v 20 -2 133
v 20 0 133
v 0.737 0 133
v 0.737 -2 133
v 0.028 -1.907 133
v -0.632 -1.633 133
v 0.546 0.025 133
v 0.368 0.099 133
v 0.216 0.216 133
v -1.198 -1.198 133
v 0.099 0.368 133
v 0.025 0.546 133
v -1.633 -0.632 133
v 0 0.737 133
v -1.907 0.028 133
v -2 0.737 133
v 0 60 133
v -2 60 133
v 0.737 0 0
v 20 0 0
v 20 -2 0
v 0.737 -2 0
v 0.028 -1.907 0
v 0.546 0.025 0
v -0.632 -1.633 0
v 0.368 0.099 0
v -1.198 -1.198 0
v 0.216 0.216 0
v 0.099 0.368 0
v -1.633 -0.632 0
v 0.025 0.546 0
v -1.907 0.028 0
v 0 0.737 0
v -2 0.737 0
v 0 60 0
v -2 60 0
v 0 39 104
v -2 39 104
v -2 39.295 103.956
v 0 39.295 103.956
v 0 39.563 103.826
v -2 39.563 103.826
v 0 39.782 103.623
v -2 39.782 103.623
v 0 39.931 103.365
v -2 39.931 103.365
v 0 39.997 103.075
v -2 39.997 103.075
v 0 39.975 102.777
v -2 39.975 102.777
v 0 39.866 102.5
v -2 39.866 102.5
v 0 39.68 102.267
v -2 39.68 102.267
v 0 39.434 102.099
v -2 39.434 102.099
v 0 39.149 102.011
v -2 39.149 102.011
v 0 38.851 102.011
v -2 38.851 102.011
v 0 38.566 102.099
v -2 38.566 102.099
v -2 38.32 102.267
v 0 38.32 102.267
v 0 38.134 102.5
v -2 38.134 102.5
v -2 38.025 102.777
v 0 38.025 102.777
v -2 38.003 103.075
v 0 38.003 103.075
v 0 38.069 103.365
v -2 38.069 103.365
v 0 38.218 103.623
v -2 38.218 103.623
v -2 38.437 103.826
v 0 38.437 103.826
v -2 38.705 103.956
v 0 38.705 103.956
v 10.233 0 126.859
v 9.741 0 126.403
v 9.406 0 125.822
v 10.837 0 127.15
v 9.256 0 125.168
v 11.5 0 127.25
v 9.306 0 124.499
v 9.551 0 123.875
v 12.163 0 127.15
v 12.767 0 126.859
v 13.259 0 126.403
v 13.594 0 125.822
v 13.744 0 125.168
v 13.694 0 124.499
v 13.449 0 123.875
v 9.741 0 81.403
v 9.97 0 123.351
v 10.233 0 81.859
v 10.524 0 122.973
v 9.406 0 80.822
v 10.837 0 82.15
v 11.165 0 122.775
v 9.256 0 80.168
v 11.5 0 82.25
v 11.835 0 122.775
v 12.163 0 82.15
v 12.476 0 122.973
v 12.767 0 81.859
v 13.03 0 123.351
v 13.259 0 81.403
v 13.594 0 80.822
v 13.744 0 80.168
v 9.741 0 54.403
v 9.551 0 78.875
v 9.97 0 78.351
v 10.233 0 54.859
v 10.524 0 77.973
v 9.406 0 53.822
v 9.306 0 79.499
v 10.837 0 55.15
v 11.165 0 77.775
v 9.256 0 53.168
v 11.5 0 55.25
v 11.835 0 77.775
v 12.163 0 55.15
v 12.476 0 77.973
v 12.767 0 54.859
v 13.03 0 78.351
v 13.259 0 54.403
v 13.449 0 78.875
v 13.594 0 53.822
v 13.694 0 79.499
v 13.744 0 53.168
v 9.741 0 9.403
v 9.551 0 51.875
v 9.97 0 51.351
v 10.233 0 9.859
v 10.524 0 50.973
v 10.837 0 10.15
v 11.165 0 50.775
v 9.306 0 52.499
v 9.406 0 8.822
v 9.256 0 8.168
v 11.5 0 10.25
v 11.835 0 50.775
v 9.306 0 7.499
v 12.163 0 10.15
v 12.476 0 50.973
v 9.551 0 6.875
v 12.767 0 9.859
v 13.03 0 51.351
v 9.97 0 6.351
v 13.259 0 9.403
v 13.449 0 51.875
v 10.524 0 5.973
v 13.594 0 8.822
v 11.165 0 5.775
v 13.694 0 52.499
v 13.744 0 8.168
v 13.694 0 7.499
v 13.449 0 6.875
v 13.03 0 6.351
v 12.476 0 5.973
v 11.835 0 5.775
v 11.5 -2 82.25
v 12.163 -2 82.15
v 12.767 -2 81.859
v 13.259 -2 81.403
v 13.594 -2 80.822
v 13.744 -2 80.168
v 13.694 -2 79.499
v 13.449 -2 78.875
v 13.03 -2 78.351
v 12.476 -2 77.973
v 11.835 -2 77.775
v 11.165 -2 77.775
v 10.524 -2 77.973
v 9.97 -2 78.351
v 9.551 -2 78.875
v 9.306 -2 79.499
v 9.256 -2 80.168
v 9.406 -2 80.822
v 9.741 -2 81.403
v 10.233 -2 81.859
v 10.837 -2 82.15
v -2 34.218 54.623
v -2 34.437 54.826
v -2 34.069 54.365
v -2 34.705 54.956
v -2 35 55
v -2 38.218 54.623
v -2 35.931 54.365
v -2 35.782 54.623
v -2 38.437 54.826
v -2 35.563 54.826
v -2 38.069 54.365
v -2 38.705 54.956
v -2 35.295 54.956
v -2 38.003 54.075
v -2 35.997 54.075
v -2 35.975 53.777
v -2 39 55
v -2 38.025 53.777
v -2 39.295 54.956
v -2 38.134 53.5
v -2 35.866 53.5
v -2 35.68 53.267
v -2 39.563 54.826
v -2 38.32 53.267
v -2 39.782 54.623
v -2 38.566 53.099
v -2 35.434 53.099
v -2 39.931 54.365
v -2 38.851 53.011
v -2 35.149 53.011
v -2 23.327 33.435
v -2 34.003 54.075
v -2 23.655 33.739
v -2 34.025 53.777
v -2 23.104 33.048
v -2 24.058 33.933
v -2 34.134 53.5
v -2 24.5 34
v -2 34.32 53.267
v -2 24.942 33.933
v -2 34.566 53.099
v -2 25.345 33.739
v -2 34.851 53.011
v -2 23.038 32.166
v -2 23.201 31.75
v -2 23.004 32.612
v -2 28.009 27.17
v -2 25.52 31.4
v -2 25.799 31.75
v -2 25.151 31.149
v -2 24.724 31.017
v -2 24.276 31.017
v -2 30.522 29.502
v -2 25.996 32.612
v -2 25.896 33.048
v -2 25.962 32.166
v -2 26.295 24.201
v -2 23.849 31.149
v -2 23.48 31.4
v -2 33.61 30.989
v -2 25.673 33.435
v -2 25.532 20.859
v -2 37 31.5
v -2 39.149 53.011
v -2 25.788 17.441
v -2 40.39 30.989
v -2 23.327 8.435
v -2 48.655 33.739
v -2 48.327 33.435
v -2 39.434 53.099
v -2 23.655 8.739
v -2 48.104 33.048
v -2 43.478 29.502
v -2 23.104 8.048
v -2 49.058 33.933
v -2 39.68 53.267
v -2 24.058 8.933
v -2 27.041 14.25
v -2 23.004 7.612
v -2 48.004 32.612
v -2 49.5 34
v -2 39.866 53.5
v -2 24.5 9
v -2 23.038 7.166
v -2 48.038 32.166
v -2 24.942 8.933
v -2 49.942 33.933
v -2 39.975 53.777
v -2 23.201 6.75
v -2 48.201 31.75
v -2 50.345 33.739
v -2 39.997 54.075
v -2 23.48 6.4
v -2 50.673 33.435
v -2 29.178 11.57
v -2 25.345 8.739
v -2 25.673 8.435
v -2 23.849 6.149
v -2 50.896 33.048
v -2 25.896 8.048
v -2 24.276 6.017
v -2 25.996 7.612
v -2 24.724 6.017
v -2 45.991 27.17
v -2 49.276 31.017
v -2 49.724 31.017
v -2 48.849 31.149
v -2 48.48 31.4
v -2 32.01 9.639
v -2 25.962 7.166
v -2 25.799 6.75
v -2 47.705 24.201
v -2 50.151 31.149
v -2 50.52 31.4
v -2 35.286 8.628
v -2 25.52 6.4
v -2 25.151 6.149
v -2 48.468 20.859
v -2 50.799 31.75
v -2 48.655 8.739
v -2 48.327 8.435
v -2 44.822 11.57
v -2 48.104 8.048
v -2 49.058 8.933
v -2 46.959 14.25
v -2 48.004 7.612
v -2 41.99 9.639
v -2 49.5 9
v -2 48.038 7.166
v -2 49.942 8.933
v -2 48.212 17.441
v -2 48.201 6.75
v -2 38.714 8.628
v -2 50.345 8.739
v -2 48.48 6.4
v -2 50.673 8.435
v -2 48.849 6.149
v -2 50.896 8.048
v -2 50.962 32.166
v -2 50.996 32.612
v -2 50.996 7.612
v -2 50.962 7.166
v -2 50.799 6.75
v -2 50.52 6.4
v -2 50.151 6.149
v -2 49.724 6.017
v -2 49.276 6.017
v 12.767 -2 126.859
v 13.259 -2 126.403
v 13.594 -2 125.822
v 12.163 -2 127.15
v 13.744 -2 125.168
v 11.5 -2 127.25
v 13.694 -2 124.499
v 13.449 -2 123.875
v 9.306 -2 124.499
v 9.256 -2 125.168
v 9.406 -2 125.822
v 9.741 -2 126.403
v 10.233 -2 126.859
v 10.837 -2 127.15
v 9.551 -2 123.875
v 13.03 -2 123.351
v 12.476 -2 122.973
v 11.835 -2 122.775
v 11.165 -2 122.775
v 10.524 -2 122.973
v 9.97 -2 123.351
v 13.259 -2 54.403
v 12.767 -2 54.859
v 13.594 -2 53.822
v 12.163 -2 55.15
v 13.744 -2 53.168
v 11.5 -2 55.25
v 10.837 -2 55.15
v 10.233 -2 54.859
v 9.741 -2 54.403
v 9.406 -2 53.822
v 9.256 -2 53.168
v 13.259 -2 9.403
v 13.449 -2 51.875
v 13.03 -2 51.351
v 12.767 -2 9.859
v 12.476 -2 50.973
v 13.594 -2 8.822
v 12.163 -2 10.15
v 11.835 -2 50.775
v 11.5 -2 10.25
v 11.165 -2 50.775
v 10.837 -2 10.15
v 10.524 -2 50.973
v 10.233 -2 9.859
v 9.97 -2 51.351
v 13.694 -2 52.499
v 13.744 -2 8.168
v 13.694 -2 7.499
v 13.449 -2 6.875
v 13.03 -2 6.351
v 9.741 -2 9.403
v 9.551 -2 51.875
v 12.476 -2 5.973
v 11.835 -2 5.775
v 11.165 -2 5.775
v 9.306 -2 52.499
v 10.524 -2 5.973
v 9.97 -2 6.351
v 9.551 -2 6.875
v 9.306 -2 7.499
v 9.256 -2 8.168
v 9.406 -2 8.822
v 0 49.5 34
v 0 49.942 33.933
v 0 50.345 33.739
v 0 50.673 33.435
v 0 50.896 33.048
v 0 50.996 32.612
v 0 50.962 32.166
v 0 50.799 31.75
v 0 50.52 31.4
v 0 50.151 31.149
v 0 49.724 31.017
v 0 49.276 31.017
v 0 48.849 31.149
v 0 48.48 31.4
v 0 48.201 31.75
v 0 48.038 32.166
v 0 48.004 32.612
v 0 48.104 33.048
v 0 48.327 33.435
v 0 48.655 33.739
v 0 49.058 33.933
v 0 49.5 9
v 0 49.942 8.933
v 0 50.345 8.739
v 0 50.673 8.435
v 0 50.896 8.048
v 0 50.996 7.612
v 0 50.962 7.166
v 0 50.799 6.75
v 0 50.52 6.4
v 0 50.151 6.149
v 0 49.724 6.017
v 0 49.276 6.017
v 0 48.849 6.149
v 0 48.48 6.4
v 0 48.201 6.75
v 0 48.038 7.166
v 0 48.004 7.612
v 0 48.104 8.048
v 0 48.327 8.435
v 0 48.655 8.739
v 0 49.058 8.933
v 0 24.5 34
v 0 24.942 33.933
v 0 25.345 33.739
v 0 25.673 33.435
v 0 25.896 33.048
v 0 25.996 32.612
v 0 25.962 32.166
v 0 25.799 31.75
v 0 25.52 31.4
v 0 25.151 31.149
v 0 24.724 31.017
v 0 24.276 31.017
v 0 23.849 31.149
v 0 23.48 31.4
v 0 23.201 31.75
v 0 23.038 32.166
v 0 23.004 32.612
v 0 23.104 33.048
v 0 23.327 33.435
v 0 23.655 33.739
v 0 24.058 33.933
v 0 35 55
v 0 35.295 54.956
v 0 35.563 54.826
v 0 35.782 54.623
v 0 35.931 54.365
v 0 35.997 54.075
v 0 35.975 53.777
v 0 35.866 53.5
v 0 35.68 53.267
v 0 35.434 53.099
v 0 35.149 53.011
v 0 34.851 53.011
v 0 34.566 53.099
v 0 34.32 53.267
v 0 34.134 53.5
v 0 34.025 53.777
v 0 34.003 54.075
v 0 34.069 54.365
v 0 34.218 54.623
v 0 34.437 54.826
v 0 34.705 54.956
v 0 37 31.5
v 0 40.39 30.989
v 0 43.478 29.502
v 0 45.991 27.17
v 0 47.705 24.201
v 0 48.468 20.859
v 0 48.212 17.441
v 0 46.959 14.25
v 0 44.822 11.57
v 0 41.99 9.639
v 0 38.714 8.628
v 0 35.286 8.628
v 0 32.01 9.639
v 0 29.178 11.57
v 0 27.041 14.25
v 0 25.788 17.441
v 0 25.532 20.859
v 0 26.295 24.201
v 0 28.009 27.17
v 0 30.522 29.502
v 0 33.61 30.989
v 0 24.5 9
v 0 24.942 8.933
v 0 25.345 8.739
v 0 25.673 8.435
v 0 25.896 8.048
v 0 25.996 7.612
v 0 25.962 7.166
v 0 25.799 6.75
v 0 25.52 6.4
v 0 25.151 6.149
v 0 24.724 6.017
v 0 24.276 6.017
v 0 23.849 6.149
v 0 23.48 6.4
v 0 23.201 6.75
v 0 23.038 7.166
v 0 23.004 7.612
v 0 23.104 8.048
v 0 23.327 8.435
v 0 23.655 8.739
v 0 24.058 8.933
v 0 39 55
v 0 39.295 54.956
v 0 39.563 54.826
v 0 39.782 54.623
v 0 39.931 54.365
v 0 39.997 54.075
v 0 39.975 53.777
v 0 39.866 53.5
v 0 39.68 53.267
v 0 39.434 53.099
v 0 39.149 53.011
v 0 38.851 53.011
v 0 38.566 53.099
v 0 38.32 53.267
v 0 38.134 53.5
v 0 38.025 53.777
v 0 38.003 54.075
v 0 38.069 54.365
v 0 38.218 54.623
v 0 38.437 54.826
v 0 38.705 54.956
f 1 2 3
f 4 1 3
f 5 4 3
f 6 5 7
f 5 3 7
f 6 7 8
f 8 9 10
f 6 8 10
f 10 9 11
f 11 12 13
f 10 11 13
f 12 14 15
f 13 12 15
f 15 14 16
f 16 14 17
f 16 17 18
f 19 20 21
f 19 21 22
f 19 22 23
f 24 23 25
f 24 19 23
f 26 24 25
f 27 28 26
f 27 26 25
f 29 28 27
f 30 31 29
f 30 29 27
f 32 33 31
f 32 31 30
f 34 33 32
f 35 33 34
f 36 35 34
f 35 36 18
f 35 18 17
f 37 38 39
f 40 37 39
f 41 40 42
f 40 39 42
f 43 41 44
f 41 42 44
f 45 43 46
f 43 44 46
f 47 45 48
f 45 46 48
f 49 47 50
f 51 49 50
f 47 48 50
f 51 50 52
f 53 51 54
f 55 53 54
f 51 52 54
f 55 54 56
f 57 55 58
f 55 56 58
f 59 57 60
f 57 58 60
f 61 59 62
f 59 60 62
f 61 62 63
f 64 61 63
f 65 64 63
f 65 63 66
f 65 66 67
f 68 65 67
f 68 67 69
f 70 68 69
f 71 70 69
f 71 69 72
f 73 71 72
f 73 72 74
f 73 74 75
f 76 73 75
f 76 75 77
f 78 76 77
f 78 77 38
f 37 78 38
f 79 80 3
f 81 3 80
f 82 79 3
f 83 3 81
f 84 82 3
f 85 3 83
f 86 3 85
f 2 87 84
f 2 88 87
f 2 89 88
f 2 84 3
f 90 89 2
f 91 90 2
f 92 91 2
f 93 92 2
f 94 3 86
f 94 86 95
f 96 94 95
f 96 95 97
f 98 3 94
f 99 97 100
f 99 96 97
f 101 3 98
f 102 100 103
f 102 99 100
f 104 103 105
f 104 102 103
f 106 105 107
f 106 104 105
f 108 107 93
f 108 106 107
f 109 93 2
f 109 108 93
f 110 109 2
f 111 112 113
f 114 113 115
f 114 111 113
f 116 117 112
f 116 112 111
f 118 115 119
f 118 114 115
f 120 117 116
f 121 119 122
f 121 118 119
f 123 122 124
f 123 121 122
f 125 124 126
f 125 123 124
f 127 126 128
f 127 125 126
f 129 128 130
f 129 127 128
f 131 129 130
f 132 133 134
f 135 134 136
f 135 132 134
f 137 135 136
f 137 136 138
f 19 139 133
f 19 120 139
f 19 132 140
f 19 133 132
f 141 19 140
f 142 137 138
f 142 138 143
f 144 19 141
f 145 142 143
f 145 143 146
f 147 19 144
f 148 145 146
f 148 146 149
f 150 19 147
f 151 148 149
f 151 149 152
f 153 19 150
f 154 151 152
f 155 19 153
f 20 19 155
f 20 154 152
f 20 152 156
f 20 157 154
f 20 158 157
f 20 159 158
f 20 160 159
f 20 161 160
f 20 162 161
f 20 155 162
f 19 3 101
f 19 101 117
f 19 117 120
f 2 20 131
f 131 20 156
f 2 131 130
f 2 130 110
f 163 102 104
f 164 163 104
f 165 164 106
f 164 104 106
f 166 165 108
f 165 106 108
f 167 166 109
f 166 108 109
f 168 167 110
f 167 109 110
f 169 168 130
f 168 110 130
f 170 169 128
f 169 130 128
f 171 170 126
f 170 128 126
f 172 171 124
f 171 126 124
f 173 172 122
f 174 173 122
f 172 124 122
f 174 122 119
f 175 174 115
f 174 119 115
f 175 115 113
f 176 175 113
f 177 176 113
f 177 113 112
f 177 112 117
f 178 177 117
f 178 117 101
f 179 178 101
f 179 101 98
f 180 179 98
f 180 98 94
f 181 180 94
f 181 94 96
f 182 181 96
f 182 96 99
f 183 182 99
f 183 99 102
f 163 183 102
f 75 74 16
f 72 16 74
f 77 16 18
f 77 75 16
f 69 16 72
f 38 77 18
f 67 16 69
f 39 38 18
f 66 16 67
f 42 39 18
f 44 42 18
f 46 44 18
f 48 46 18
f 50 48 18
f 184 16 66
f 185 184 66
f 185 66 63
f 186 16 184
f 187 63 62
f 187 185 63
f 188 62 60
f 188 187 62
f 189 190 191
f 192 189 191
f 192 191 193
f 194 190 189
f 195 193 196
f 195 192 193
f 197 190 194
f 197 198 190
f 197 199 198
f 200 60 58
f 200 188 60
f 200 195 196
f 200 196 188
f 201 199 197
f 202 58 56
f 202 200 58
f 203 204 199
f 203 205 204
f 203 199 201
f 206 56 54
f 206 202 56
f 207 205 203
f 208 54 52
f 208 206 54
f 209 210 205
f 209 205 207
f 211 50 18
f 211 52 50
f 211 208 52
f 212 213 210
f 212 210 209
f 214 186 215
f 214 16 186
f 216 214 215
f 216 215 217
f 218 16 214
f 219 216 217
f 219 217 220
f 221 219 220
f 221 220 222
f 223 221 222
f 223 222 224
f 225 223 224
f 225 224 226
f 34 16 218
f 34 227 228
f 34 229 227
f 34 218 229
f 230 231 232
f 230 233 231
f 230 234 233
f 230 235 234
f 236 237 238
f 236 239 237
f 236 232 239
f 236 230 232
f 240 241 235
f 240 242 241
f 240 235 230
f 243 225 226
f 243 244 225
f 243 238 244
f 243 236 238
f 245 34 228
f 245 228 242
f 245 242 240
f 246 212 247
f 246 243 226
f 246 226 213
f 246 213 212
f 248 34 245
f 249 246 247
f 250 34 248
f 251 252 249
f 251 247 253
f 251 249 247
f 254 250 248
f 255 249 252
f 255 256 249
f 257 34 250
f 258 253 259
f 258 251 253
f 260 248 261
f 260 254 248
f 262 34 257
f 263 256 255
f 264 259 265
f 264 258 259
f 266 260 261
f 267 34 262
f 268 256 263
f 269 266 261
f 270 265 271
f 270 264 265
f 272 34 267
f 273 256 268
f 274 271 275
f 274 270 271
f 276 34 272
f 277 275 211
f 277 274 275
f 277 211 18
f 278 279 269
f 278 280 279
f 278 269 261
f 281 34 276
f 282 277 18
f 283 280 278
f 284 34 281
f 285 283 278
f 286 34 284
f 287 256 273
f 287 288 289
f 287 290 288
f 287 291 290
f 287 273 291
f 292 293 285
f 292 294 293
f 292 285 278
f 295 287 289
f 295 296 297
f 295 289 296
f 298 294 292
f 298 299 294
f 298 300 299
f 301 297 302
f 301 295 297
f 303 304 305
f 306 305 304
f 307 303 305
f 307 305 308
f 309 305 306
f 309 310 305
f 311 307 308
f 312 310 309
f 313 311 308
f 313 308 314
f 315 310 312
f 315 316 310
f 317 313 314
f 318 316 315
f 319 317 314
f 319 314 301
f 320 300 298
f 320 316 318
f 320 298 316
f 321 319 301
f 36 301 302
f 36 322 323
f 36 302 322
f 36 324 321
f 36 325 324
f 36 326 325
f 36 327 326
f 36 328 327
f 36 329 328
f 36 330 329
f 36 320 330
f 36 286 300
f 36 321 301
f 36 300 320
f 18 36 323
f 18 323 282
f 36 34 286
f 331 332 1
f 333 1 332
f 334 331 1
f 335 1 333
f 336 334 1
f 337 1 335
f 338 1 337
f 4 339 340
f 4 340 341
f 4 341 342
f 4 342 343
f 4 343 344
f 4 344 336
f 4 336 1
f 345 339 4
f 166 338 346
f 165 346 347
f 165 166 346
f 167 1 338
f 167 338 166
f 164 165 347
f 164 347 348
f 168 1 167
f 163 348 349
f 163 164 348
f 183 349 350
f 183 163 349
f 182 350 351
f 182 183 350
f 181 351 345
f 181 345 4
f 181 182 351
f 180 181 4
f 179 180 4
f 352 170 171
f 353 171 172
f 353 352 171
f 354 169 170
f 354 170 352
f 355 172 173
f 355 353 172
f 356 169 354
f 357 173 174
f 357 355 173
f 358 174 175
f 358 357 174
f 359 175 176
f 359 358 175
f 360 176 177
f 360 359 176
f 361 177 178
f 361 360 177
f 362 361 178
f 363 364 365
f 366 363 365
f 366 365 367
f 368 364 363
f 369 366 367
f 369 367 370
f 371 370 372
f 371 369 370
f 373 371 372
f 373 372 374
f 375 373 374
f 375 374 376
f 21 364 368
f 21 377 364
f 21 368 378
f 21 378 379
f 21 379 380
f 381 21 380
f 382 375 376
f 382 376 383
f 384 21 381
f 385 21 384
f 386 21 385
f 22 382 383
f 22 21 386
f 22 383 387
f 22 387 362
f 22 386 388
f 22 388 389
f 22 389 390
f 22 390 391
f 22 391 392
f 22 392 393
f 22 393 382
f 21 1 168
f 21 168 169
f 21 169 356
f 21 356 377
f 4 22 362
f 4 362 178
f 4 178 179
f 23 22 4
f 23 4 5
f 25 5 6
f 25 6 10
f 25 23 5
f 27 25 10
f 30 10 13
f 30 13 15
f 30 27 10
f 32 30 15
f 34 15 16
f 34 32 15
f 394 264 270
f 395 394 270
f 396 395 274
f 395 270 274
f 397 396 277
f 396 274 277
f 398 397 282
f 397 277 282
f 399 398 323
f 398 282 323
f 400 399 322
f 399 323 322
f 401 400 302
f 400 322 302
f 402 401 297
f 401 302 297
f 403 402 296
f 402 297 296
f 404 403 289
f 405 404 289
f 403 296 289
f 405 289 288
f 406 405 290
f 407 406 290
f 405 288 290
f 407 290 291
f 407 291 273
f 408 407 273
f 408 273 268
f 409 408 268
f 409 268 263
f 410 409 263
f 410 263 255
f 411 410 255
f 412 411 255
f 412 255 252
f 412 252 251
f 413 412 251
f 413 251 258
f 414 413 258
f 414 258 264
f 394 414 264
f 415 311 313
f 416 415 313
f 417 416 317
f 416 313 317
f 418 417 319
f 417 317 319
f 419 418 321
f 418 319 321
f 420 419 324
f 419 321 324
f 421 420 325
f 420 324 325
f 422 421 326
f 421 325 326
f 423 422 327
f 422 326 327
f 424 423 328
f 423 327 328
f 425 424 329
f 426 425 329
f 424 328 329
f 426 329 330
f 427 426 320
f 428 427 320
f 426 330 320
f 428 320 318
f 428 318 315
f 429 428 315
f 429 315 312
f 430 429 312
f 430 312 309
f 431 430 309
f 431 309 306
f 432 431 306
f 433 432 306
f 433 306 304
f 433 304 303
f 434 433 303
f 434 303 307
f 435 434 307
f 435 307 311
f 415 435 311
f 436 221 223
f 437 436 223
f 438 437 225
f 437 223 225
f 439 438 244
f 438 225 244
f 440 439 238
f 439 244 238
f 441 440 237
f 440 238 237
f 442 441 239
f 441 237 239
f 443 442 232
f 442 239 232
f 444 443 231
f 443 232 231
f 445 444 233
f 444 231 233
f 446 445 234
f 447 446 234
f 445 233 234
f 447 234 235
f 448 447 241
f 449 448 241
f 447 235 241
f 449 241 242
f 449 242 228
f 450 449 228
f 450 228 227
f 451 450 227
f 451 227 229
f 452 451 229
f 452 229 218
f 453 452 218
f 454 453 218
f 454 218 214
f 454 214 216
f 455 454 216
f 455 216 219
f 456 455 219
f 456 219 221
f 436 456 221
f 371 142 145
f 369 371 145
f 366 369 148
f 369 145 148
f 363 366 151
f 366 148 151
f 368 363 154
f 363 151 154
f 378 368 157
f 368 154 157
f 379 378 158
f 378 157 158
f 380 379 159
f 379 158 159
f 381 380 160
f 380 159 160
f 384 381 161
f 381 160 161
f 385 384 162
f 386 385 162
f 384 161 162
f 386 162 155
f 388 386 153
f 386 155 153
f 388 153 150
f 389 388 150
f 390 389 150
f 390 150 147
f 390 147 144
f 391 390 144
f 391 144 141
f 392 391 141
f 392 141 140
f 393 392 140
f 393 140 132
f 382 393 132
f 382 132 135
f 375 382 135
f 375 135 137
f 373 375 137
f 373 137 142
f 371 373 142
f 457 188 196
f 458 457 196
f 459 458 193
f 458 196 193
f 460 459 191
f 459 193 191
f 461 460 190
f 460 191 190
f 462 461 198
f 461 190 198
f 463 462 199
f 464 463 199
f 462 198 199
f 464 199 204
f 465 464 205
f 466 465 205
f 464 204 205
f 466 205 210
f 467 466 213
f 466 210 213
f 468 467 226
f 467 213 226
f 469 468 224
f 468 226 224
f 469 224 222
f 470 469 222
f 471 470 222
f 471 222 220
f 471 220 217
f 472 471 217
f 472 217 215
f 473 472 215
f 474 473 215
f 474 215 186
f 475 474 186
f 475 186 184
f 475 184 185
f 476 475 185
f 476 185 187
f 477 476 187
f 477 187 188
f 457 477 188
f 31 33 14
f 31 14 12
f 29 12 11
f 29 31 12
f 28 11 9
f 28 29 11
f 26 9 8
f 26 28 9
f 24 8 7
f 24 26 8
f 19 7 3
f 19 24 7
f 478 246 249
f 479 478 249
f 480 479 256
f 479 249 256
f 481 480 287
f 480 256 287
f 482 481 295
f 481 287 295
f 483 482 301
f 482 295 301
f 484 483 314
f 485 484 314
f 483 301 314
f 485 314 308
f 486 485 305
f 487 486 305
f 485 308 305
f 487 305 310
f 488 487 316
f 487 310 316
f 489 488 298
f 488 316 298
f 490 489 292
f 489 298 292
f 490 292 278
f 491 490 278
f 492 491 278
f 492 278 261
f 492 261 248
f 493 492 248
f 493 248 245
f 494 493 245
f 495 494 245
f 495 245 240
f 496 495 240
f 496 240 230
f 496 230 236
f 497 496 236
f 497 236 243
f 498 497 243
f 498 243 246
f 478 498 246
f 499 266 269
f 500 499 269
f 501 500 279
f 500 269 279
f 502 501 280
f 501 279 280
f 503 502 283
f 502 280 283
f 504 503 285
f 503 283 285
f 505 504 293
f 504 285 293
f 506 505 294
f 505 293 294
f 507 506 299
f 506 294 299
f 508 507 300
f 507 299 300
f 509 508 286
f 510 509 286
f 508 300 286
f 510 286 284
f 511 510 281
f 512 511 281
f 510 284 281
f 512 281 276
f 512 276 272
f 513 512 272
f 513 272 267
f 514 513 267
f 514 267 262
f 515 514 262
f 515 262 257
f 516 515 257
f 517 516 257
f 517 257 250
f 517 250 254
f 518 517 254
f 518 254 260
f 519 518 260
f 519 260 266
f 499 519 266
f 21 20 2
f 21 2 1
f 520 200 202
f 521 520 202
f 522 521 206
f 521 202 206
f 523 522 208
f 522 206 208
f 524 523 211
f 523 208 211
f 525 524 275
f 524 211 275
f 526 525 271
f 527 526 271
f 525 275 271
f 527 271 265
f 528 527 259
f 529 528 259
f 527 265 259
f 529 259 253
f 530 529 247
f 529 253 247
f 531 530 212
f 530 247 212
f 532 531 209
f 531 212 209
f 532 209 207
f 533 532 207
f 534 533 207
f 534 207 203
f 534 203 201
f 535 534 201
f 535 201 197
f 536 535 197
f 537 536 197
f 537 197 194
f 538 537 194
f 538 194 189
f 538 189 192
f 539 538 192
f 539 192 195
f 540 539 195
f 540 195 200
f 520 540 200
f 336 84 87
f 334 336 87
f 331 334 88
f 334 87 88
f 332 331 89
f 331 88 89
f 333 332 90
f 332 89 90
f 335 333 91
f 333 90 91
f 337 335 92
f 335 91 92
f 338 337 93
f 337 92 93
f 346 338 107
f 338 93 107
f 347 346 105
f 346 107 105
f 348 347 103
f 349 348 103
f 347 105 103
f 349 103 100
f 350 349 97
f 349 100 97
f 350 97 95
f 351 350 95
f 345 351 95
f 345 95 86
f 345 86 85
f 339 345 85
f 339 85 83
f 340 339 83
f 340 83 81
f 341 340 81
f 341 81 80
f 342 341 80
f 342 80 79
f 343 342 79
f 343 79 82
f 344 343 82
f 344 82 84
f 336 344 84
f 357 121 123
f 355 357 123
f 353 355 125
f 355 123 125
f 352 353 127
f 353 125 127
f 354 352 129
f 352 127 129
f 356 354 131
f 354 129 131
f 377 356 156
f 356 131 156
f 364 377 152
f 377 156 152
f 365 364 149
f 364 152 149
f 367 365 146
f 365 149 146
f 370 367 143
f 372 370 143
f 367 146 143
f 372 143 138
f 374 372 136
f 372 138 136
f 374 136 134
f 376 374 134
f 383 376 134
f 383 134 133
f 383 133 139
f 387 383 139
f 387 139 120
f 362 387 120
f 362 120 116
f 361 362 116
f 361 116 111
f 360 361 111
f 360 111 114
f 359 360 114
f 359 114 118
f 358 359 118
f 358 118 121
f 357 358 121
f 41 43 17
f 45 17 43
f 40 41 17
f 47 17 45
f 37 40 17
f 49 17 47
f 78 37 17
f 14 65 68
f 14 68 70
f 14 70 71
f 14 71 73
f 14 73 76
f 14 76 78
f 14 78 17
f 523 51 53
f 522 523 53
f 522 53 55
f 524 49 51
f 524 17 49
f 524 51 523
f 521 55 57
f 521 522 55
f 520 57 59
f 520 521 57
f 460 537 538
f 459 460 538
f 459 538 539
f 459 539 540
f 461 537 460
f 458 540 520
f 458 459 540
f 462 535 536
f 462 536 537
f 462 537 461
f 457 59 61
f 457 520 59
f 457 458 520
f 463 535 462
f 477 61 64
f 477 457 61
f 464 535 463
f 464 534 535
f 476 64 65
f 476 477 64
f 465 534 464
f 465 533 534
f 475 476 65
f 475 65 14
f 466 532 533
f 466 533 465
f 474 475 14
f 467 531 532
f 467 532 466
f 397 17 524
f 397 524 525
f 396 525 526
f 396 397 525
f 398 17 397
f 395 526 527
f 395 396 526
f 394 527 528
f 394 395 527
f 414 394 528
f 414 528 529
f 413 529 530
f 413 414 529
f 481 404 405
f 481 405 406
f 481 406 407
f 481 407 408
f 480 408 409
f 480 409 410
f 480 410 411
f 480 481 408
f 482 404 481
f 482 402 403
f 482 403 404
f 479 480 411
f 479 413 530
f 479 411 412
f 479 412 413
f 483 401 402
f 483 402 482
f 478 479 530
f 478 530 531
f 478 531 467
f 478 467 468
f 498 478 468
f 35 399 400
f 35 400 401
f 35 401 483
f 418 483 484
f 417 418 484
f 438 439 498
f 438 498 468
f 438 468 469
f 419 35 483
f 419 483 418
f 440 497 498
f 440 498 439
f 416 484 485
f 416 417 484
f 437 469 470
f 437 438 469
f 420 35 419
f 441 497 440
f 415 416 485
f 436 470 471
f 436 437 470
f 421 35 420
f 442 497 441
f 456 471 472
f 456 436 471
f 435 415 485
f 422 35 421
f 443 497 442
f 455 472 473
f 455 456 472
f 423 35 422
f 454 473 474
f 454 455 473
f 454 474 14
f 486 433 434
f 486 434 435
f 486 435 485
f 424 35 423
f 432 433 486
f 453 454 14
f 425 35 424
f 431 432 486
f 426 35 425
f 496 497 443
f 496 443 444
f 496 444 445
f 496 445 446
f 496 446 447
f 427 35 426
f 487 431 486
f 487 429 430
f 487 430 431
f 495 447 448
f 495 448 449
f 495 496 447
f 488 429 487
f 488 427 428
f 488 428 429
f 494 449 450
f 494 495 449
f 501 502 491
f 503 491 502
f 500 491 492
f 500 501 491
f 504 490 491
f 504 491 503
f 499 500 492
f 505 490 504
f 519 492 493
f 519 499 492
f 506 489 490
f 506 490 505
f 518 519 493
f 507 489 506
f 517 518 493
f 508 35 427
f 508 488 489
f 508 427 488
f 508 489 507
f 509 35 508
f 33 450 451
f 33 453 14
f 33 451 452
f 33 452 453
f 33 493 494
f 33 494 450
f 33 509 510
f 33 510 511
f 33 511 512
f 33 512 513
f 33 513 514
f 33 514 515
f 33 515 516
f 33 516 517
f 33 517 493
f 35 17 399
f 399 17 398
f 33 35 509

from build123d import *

# Parameters (mm, degrees)
SM_BASE_FLANGE_1_DEPTH = 133
CUT_EXTRUDE_1_REACH    = 149.557
SKETCH_2_R             = 1
SKETCH_2_R_2           = 11.5
M3X0_5_1_D             = 2.5
M3X0_5_1_DEPTH         = 7.5
M3X0_5_1_CBORE_D       = 3
M3X0_5_1_CBORE_DEPTH   = 6
M3X0_5_1_TIP           = 0.751075774
SKETCH_5_R             = 2.25
CUT_EXTRUDE_2_DEPTH    = 148.271857461


# Sheet-metal steps are written as plain solids
with BuildPart() as part:
    # Sketch 1 → 基材-凸緣1 (new body)
    with BuildSketch(Plane.XY):
        with BuildLine():
            Line((0, 60), (0, 0.7366))
            ThreePointArc((0, 0.7366), (0.215745145, 0.215745145), (0.7366, 0))
            Line((0.7366, 0), (20, 0))
            Line((20, 0), (20, -2))
            Line((20, -2), (0.7366, -2))
            ThreePointArc((0.7366, -2), (-1.198468417, -1.198468417), (-2, 0.7366))
            Line((-2, 0.7366), (-2, 60))
            Line((-2, 60), (0, 60))
        make_face()
    extrude(amount=SM_BASE_FLANGE_1_DEPTH)

    # Sketch 2 → 除料-伸長1 (cut, up to next)
    with BuildSketch(Plane.ZY.offset(2), mode=Mode.PRIVATE) as cut_extrude_1_sk1:
        with Locations((103, 39)):
            Circle(SKETCH_2_R)
    cut_extrude_1_tool1 = extrude(cut_extrude_1_sk1.sketch, amount=-CUT_EXTRUDE_1_REACH, mode=Mode.PRIVATE) & part.part
    # Sketch 2 → 除料-伸長1 (cut, up to next)
    with BuildSketch(Plane.ZY.offset(2), mode=Mode.PRIVATE) as cut_extrude_1_sk2:
        with Locations((54, 39)):
            Circle(SKETCH_2_R)
    cut_extrude_1_tool2 = extrude(cut_extrude_1_sk2.sketch, amount=-CUT_EXTRUDE_1_REACH, mode=Mode.PRIVATE) & part.part
    # Sketch 2 → 除料-伸長1 (cut, up to next)
    with BuildSketch(Plane.ZY.offset(2), mode=Mode.PRIVATE) as cut_extrude_1_sk3:
        with Locations((54, 35)):
            Circle(SKETCH_2_R)
    cut_extrude_1_tool3 = extrude(cut_extrude_1_sk3.sketch, amount=-CUT_EXTRUDE_1_REACH, mode=Mode.PRIVATE) & part.part
    # Sketch 2 → 除料-伸長1 (cut, up to next)
    with BuildSketch(Plane.ZY.offset(2), mode=Mode.PRIVATE) as cut_extrude_1_sk4:
        with Locations((20, 37)):
            Circle(SKETCH_2_R_2)
    cut_extrude_1_tool4 = extrude(cut_extrude_1_sk4.sketch, amount=-CUT_EXTRUDE_1_REACH, mode=Mode.PRIVATE) & part.part
    add(cut_extrude_1_tool1.solids().sort_by_distance((-2, 39, 103))[0], mode=Mode.SUBTRACT)
    add(cut_extrude_1_tool2.solids().sort_by_distance((-2, 39, 54))[0], mode=Mode.SUBTRACT)
    add(cut_extrude_1_tool3.solids().sort_by_distance((-2, 35, 54))[0], mode=Mode.SUBTRACT)
    add(cut_extrude_1_tool4.solids().sort_by_distance((-2, 37, 20))[0], mode=Mode.SUBTRACT)

    # M3x0.5 螺紋孔1
    with Locations(Plane.ZY.offset(2)):
        with Locations((32.5, 49.5), (32.5, 24.5), (7.5, 49.5), (7.5, 24.5)):
            CounterBoreHole(M3X0_5_1_D / 2, M3X0_5_1_CBORE_D / 2, M3X0_5_1_CBORE_DEPTH, depth=M3X0_5_1_DEPTH)
            with Locations((0, 0, -(M3X0_5_1_DEPTH + M3X0_5_1_TIP / 2))):  # 118° drill point
                Cone(0, M3X0_5_1_D / 2, M3X0_5_1_TIP, mode=Mode.SUBTRACT)

    # 草圖5 → 除料-伸長2 (cut, through all)
    with BuildSketch(Plane(origin=(0, 0, 0), x_dir=(1, 0, 0), z_dir=(0, 1, 0))):
        with Locations(Location((11.5, -125, 0), (0, 0, 270))):
            Circle(SKETCH_5_R)
        with Locations(Location((11.5, -80, 0), (0, 0, 270))):
            Circle(SKETCH_5_R)
        with Locations(Location((11.5, -53, 0), (0, 0, 270))):
            Circle(SKETCH_5_R)
        with Locations(Location((11.5, -8, 0), (0, 0, 270))):
            Circle(SKETCH_5_R)
    extrude(amount=-CUT_EXTRUDE_2_DEPTH, mode=Mode.SUBTRACT)


solid = part.part
